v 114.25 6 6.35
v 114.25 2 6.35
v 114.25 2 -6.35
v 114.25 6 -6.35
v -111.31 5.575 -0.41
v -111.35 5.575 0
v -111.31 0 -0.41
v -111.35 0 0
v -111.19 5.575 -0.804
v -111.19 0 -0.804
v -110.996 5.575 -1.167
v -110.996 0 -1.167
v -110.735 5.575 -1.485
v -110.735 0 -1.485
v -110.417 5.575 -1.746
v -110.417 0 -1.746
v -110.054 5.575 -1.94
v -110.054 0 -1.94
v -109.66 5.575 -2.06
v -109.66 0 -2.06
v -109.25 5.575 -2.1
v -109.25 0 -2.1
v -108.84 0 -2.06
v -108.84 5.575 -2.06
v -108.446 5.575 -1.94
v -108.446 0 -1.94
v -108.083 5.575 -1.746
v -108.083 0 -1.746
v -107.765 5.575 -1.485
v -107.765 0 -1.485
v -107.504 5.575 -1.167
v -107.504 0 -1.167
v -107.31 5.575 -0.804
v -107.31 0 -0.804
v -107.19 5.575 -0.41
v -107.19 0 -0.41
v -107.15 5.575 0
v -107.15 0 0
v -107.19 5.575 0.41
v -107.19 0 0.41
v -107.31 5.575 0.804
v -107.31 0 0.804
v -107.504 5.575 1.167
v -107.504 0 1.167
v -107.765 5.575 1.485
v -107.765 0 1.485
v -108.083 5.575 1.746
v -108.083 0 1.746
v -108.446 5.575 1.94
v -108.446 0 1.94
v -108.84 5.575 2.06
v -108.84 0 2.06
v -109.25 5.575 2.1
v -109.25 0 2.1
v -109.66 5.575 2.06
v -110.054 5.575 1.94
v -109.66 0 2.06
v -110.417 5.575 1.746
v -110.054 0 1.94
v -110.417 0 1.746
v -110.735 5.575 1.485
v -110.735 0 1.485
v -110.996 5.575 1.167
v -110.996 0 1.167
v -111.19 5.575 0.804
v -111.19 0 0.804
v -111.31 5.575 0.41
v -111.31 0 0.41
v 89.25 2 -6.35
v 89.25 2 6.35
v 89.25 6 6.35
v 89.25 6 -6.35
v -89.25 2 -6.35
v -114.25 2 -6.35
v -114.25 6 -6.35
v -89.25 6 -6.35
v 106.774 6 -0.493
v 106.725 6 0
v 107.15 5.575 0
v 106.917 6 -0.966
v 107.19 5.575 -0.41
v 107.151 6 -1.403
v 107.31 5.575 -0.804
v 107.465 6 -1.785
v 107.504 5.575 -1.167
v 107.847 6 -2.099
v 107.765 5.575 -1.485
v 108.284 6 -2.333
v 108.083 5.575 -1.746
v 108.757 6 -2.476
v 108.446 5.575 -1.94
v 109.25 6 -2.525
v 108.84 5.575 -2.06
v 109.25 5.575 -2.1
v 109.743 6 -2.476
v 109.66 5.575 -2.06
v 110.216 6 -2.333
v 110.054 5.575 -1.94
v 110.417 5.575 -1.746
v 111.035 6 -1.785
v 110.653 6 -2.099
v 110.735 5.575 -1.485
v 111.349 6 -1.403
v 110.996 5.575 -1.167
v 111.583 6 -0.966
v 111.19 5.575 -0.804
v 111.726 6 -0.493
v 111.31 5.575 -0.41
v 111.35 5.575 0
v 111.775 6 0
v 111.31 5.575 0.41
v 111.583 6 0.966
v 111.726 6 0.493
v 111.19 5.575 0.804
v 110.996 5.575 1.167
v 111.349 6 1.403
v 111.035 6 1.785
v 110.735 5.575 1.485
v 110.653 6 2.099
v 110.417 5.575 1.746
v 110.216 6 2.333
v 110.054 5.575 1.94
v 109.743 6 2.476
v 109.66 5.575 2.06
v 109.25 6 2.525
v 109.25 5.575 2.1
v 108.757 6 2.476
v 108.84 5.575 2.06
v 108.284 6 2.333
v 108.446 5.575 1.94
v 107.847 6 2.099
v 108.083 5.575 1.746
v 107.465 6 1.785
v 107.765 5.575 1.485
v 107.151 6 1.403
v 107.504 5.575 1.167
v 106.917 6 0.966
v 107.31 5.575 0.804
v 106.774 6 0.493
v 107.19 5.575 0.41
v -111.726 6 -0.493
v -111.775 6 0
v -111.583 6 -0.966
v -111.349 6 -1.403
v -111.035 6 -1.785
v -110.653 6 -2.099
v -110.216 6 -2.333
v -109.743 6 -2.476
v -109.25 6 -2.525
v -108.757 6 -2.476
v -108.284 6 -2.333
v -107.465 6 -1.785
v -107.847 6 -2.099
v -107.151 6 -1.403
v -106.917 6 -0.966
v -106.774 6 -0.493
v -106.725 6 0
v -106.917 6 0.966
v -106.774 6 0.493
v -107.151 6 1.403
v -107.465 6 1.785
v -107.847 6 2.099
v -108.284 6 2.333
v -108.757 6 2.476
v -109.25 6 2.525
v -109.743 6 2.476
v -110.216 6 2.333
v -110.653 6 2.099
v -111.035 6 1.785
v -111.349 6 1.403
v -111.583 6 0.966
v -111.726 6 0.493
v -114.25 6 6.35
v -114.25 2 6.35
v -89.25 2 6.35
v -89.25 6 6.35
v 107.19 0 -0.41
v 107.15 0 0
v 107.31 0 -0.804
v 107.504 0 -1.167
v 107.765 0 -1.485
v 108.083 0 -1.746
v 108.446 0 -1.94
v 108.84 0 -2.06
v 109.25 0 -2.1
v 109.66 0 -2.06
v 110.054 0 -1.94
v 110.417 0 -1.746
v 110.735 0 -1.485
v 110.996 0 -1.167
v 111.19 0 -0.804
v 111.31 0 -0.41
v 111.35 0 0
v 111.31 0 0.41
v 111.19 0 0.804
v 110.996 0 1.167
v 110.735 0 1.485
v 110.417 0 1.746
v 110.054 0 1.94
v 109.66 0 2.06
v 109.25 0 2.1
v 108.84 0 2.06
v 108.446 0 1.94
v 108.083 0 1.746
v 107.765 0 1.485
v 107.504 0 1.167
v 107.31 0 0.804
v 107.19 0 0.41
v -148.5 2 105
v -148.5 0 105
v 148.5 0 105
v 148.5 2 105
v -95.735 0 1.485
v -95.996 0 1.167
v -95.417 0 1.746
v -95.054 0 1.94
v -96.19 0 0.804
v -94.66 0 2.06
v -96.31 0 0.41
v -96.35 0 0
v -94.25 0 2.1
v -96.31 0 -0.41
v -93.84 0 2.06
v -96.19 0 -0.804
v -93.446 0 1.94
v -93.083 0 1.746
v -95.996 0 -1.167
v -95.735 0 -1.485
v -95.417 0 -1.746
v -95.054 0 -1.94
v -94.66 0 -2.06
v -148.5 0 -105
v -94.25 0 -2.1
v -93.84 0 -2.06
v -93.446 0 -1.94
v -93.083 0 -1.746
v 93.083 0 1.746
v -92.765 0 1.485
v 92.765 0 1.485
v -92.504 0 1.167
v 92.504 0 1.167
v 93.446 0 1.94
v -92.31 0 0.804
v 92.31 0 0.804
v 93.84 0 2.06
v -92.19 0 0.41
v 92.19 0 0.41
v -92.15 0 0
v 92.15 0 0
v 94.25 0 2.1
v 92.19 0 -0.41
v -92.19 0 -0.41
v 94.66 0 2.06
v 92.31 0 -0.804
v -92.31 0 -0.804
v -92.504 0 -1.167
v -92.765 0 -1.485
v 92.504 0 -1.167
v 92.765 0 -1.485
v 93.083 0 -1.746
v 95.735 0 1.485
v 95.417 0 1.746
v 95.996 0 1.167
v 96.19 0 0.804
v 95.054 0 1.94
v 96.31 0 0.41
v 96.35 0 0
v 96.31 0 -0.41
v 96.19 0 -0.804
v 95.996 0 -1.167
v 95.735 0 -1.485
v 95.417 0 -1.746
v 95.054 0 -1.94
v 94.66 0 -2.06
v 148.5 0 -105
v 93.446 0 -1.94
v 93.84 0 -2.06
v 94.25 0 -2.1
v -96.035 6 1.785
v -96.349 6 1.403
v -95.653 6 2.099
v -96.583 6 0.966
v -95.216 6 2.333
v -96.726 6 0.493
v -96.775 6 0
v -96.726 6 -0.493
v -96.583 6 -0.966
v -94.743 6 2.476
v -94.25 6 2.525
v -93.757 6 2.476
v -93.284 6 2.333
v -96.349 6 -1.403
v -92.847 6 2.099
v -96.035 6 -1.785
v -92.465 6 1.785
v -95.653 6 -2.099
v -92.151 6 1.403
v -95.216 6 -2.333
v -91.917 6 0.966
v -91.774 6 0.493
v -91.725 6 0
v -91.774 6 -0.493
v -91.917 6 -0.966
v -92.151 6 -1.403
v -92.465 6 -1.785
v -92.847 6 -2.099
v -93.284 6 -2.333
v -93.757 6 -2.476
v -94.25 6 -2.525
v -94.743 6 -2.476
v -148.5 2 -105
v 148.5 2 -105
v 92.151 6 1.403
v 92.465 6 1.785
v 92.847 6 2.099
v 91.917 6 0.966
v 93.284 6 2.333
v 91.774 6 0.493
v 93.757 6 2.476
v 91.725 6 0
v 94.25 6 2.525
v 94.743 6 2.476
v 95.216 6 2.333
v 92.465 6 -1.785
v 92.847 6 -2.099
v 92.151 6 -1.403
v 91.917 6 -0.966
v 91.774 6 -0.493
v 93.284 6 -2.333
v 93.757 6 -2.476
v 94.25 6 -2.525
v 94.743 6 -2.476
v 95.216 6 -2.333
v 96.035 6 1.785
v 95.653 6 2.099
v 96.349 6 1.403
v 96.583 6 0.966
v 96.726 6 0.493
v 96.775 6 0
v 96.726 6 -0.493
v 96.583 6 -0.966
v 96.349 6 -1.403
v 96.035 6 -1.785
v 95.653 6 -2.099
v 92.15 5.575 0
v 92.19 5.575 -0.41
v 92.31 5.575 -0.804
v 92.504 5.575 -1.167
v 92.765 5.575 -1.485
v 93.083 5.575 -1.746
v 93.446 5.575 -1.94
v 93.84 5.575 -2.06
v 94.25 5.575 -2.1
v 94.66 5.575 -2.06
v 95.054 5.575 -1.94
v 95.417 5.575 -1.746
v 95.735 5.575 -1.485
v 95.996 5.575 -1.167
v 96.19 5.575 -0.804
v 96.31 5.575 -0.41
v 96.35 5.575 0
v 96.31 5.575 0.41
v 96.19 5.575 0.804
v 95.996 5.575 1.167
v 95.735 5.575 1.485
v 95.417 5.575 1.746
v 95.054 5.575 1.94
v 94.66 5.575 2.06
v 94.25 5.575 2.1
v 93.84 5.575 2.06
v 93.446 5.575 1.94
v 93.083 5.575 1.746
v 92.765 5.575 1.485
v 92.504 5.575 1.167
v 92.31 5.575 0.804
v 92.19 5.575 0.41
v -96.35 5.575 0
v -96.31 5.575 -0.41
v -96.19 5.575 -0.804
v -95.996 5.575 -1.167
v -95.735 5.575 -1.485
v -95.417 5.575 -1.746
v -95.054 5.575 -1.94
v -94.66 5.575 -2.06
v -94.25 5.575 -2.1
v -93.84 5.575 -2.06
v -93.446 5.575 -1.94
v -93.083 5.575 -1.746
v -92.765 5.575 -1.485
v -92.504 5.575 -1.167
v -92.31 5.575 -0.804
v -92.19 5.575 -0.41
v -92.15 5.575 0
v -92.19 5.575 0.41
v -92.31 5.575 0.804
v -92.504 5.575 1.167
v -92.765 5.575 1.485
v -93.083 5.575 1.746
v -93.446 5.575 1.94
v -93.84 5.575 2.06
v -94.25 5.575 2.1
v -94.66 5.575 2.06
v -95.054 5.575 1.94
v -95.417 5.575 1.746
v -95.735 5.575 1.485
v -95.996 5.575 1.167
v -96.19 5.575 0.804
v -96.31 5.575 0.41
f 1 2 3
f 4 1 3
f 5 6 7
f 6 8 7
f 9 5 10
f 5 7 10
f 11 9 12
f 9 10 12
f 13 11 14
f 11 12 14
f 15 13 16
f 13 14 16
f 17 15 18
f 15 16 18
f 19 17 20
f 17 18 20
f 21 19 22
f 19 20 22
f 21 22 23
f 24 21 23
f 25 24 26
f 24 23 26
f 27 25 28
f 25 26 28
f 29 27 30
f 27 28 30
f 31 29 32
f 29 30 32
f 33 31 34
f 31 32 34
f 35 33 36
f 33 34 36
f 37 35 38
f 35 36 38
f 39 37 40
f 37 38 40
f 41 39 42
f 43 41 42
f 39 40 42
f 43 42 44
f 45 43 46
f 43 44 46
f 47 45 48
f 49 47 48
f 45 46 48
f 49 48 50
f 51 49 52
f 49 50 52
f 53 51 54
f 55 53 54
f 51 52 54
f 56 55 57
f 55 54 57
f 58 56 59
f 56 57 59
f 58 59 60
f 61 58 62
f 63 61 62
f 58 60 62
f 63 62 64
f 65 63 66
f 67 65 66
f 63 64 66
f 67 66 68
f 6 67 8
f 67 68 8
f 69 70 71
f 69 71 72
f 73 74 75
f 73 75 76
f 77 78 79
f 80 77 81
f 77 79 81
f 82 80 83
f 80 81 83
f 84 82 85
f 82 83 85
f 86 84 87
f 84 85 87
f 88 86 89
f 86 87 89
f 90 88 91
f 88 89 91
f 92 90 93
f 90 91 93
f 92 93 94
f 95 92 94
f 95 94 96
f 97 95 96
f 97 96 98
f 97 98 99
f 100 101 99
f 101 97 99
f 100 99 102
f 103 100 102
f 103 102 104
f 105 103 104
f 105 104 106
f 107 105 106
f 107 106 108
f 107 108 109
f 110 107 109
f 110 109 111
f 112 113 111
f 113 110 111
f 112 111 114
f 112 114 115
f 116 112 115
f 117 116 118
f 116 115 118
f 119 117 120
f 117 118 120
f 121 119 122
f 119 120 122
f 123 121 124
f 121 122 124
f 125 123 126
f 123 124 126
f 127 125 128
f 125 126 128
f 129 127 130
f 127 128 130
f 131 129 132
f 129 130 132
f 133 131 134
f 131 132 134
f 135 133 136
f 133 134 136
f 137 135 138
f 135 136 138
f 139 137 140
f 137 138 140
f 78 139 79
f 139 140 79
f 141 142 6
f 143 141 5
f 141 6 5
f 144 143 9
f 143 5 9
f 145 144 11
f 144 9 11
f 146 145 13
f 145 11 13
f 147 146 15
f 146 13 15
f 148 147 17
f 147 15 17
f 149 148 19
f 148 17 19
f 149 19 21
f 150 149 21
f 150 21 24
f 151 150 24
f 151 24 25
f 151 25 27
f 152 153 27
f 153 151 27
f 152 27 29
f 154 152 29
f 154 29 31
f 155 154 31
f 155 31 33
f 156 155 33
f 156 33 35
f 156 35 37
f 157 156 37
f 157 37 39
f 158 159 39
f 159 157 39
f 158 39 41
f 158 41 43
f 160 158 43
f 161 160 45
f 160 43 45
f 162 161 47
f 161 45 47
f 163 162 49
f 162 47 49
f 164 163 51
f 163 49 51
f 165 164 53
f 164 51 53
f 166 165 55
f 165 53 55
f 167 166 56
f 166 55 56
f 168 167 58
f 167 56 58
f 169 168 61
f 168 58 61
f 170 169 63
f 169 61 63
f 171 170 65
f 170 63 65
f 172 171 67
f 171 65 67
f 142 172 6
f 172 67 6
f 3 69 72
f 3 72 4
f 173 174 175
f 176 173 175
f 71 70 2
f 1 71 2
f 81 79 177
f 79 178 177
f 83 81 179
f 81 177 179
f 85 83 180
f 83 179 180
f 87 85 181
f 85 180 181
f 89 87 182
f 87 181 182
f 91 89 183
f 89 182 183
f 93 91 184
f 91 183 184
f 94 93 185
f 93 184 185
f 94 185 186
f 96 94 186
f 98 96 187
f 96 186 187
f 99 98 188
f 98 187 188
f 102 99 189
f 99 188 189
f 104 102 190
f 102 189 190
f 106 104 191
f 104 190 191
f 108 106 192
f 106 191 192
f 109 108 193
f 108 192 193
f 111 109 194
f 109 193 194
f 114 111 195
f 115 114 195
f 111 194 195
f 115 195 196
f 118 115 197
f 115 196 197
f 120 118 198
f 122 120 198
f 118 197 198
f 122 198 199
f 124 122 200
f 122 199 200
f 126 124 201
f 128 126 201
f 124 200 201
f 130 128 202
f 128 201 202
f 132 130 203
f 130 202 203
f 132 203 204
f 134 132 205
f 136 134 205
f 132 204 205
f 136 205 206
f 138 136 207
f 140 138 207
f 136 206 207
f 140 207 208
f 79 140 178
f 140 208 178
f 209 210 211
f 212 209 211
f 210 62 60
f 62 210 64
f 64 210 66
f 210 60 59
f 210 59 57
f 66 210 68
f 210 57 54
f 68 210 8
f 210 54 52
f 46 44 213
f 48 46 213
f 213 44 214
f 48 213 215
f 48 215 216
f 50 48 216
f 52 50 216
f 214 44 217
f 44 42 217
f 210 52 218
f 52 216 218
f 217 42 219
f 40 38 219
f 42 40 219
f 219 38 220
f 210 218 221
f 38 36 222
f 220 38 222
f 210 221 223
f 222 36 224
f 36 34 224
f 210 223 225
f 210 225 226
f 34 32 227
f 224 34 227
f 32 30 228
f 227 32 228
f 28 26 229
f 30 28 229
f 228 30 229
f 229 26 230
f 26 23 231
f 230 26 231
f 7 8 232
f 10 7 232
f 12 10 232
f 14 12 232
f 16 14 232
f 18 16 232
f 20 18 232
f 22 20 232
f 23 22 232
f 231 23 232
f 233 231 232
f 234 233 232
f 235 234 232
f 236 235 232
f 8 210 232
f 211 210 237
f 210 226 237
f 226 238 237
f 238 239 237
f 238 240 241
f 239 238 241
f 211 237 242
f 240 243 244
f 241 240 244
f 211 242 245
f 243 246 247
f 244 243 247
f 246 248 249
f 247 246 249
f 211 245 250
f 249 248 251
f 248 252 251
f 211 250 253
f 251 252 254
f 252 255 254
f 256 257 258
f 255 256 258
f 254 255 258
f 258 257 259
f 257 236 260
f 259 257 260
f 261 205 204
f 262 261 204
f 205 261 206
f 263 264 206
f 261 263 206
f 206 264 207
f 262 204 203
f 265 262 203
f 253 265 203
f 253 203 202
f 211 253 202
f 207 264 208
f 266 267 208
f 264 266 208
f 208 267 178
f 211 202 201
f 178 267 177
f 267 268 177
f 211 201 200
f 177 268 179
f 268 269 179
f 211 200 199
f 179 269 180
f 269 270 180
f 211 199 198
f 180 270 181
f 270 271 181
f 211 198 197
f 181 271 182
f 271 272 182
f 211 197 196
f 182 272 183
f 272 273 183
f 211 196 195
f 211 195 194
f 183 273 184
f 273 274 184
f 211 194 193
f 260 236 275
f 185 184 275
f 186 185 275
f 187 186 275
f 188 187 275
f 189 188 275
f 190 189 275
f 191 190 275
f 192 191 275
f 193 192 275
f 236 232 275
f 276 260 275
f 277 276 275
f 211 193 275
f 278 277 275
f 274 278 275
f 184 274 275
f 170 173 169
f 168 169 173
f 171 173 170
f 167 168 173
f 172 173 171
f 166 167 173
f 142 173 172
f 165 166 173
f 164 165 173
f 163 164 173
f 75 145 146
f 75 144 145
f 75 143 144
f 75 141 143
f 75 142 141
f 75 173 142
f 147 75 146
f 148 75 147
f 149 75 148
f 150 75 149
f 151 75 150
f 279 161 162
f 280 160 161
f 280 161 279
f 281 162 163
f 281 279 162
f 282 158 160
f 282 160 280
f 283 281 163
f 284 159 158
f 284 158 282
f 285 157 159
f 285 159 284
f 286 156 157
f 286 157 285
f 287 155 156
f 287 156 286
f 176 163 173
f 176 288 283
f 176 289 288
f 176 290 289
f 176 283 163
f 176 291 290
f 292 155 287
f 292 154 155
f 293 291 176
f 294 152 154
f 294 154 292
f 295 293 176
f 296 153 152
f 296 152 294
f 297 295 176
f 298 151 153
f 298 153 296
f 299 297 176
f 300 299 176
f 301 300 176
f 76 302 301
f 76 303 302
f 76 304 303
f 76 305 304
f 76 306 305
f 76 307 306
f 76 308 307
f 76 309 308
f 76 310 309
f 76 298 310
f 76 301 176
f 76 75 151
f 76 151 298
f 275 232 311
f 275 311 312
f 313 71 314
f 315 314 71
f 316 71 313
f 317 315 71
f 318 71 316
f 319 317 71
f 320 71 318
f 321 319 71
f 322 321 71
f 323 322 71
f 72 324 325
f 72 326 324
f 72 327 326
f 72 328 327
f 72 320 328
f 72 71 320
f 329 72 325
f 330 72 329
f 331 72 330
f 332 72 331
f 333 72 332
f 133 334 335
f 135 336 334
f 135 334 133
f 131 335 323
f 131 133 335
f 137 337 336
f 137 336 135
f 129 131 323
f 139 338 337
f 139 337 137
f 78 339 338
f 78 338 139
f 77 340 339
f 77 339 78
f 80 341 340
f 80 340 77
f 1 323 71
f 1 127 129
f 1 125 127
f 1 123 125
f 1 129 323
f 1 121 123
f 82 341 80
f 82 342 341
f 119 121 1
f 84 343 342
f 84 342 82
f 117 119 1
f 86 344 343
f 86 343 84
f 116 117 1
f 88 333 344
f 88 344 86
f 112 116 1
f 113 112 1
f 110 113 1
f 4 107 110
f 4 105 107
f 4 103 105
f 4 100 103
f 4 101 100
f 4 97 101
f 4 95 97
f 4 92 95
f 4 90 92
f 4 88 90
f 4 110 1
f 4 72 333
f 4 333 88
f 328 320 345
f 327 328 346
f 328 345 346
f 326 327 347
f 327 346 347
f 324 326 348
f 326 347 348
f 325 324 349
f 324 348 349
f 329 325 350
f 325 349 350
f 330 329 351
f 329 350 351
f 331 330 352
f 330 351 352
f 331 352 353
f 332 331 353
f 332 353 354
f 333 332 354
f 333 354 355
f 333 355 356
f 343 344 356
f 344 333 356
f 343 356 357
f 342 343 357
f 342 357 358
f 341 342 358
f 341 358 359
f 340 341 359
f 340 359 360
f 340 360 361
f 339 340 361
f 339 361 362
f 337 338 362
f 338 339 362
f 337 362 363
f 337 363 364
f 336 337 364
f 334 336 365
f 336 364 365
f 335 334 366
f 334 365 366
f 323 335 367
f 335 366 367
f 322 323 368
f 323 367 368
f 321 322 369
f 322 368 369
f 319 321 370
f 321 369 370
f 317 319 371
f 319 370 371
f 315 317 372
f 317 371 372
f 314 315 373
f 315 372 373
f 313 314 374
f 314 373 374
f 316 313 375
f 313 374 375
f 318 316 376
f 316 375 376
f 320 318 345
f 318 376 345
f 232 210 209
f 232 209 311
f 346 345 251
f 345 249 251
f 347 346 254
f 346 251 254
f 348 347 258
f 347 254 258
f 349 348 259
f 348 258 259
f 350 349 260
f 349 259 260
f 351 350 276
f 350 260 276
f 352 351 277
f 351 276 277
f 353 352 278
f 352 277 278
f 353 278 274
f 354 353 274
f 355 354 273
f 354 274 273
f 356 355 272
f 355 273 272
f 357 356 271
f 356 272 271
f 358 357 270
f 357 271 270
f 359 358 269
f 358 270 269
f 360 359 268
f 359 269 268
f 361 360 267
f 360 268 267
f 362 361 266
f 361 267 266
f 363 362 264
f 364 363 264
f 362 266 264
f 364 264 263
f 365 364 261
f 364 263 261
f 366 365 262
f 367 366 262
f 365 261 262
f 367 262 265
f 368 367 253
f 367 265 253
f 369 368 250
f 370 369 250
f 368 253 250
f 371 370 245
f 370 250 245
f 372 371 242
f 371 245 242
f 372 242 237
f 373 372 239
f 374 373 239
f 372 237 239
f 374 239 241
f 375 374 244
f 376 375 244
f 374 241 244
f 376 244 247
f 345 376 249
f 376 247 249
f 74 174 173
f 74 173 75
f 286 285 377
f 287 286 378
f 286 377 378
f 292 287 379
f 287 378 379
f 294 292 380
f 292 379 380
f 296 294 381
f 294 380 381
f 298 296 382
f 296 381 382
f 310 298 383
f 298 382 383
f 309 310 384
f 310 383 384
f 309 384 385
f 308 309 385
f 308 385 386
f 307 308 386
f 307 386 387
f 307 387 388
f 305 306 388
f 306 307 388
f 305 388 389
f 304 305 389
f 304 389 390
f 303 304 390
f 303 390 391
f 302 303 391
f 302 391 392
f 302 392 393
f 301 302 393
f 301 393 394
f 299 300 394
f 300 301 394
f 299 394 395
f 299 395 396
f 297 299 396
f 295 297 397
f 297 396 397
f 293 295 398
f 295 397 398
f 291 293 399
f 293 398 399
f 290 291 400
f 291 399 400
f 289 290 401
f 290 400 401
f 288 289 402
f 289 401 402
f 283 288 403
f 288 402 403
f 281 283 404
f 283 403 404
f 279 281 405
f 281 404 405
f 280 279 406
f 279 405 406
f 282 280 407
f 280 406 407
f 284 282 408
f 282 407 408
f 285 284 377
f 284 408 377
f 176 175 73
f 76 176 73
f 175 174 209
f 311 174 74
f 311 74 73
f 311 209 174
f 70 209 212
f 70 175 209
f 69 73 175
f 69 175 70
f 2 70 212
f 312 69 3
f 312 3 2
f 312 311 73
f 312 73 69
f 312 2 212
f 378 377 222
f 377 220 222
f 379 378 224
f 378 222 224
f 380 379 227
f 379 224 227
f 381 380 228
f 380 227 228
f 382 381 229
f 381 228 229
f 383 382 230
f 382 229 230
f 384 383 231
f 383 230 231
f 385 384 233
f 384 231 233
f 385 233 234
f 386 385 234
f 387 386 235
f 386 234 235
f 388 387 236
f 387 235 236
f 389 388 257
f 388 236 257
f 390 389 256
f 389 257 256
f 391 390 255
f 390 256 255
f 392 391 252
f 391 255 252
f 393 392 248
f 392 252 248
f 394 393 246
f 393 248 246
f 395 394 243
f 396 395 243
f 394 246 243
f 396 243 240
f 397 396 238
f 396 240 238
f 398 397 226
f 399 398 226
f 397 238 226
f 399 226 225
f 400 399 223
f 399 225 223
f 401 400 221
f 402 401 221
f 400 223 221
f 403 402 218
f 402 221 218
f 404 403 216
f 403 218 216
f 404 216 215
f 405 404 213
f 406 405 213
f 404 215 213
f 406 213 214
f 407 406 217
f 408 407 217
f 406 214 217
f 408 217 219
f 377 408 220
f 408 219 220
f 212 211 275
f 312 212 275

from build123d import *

# Parameters (mm, degrees)
SKETCH1_W                   = 297
SKETCH1_H                   = 210
BOSS_EXTRUDE1_DEPTH         = 2
SKETCH4_W                   = 25
SKETCH4_H                   = 12.7
BOSS_EXTRUDE2_DEPTH         = 4
M5_TAPPED_HOLE1_D           = 4.2
M5_TAPPED_HOLE1_CSINK_D     = 5.05
M5_TAPPED_HOLE1_CSINK_ANGLE = 90


with BuildPart() as part:
    # Sketch1 → Boss-Extrude1 (new body)
    with BuildSketch(Plane(origin=(0, 0, 0), x_dir=(1, 0, 0), z_dir=(0, 1, 0))):
        Rectangle(SKETCH1_W, SKETCH1_H)
    extrude(amount=BOSS_EXTRUDE1_DEPTH)

    # Sketch4 → Boss-Extrude2 (add)
    with BuildSketch(Plane(origin=(0, 2, 0), x_dir=(1, 0, 0), z_dir=(0, 1, 0))):
        with Locations((101.75, 0)):
            Rectangle(SKETCH4_W, SKETCH4_H)
        with Locations((-101.75, 0)):
            Rectangle(SKETCH4_W, SKETCH4_H)
    extrude(amount=BOSS_EXTRUDE2_DEPTH)

    # M5 Tapped Hole1 (through all)
    with Locations(Plane(origin=(0, 6, 0), x_dir=(1, 0, 0), z_dir=(0, 1, 0))):
        with Locations((-109.25, 0), (109.25, 0), (94.25, 0), (-94.25, 0)):
            CounterSinkHole(M5_TAPPED_HOLE1_D / 2, M5_TAPPED_HOLE1_CSINK_D / 2, counter_sink_angle=M5_TAPPED_HOLE1_CSINK_ANGLE)


solid = part.part
